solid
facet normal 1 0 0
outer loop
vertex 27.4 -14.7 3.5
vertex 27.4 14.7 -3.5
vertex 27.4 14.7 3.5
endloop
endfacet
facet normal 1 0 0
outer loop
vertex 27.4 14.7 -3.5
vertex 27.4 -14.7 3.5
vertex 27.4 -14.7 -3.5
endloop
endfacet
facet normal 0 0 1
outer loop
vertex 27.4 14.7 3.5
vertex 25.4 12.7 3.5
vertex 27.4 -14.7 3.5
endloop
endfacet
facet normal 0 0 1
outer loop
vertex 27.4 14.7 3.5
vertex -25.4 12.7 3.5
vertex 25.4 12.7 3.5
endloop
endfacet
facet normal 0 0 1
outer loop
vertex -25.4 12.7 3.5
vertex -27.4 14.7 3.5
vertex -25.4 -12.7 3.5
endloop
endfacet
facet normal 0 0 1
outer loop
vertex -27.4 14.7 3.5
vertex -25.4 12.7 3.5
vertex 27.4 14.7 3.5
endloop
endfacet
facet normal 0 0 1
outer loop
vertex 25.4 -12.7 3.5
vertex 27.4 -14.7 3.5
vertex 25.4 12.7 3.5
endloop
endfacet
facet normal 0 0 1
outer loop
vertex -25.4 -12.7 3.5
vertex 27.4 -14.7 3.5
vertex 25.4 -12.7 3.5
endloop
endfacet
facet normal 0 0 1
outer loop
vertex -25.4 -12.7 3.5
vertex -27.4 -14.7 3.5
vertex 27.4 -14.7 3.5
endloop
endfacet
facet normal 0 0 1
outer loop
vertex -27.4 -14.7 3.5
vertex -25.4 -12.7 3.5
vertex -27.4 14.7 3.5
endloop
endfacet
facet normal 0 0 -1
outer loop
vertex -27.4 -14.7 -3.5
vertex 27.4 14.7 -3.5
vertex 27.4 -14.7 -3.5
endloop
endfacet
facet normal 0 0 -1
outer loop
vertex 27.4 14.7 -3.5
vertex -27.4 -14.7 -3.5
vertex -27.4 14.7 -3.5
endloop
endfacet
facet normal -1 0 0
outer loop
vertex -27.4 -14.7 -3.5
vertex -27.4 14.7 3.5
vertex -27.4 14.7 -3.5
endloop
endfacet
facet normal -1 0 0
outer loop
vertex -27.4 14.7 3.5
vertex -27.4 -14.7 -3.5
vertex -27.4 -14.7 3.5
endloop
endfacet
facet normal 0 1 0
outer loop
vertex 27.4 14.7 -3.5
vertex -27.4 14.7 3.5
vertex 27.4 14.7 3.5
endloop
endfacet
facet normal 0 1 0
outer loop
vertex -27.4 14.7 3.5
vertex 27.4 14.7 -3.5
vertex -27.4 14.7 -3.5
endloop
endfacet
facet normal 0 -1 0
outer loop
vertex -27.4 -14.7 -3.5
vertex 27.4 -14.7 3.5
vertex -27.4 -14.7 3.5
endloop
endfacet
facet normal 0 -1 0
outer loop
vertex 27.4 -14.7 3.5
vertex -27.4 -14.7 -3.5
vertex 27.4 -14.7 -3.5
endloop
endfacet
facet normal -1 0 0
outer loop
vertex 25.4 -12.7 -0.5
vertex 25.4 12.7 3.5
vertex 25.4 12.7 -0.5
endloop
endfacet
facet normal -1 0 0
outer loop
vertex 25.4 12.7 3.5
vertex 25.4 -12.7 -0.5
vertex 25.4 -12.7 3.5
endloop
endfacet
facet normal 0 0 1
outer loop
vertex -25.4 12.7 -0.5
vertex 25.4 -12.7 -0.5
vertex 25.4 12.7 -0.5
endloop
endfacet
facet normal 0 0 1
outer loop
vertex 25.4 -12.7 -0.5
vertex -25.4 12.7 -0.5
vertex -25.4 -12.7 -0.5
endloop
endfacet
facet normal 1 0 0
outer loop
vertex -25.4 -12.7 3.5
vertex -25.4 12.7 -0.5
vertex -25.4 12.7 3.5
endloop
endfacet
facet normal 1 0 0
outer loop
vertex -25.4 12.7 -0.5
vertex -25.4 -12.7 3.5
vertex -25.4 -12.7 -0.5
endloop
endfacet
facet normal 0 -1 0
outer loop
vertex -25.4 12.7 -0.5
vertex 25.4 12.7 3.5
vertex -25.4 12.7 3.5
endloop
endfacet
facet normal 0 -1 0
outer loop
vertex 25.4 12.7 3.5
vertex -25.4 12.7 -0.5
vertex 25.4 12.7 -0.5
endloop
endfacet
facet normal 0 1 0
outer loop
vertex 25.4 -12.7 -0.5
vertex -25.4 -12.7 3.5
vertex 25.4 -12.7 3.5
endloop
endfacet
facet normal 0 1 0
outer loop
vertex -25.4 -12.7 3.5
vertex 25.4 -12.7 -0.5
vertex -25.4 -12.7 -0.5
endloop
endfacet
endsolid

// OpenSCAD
/* 
Parameters 
*/
//Global resolution angle
$fa = .3;
//Global resolution side
$fs = .3;

//Width of the casing
width = 50.8;
//Breadth of the casing
breadth = 25.4;
//Height of the casing
height = 5;
//wall thickness
wallThickness = 2;
//allowance around the inside of the casing
allowance = 0.2;

/* Renders*/
base(width, breadth, height, wallThickness);

/* Modules */
//create outer shell
module base(shellWidth, shellBreadth, shellHeight, shellThickness){
    difference(){
    union(){
    difference(){
        cube([width+2*shellThickness, breadth+2*shellThickness, shellHeight+shellThickness], center = true);
        translate([0,0,(shellThickness/2)+1])
        cube([shellWidth, shellBreadth, shellHeight], center = true);
    }
    translate([shellWidth/2-shellHeight/2,shellBreadth/2-shellHeight/2,shellThickness])
    #cube([shellHeight/2, shellHeight/2,shellHeight], center=true);
    }
    translate([shellWidth/2-shellHeight/2,shellBreadth/2-shellHeight/2,shellThickness])
    cylinder(d=shellHeight, h=shellHeight, center=true);
    }
}

module cover(){
    
}
